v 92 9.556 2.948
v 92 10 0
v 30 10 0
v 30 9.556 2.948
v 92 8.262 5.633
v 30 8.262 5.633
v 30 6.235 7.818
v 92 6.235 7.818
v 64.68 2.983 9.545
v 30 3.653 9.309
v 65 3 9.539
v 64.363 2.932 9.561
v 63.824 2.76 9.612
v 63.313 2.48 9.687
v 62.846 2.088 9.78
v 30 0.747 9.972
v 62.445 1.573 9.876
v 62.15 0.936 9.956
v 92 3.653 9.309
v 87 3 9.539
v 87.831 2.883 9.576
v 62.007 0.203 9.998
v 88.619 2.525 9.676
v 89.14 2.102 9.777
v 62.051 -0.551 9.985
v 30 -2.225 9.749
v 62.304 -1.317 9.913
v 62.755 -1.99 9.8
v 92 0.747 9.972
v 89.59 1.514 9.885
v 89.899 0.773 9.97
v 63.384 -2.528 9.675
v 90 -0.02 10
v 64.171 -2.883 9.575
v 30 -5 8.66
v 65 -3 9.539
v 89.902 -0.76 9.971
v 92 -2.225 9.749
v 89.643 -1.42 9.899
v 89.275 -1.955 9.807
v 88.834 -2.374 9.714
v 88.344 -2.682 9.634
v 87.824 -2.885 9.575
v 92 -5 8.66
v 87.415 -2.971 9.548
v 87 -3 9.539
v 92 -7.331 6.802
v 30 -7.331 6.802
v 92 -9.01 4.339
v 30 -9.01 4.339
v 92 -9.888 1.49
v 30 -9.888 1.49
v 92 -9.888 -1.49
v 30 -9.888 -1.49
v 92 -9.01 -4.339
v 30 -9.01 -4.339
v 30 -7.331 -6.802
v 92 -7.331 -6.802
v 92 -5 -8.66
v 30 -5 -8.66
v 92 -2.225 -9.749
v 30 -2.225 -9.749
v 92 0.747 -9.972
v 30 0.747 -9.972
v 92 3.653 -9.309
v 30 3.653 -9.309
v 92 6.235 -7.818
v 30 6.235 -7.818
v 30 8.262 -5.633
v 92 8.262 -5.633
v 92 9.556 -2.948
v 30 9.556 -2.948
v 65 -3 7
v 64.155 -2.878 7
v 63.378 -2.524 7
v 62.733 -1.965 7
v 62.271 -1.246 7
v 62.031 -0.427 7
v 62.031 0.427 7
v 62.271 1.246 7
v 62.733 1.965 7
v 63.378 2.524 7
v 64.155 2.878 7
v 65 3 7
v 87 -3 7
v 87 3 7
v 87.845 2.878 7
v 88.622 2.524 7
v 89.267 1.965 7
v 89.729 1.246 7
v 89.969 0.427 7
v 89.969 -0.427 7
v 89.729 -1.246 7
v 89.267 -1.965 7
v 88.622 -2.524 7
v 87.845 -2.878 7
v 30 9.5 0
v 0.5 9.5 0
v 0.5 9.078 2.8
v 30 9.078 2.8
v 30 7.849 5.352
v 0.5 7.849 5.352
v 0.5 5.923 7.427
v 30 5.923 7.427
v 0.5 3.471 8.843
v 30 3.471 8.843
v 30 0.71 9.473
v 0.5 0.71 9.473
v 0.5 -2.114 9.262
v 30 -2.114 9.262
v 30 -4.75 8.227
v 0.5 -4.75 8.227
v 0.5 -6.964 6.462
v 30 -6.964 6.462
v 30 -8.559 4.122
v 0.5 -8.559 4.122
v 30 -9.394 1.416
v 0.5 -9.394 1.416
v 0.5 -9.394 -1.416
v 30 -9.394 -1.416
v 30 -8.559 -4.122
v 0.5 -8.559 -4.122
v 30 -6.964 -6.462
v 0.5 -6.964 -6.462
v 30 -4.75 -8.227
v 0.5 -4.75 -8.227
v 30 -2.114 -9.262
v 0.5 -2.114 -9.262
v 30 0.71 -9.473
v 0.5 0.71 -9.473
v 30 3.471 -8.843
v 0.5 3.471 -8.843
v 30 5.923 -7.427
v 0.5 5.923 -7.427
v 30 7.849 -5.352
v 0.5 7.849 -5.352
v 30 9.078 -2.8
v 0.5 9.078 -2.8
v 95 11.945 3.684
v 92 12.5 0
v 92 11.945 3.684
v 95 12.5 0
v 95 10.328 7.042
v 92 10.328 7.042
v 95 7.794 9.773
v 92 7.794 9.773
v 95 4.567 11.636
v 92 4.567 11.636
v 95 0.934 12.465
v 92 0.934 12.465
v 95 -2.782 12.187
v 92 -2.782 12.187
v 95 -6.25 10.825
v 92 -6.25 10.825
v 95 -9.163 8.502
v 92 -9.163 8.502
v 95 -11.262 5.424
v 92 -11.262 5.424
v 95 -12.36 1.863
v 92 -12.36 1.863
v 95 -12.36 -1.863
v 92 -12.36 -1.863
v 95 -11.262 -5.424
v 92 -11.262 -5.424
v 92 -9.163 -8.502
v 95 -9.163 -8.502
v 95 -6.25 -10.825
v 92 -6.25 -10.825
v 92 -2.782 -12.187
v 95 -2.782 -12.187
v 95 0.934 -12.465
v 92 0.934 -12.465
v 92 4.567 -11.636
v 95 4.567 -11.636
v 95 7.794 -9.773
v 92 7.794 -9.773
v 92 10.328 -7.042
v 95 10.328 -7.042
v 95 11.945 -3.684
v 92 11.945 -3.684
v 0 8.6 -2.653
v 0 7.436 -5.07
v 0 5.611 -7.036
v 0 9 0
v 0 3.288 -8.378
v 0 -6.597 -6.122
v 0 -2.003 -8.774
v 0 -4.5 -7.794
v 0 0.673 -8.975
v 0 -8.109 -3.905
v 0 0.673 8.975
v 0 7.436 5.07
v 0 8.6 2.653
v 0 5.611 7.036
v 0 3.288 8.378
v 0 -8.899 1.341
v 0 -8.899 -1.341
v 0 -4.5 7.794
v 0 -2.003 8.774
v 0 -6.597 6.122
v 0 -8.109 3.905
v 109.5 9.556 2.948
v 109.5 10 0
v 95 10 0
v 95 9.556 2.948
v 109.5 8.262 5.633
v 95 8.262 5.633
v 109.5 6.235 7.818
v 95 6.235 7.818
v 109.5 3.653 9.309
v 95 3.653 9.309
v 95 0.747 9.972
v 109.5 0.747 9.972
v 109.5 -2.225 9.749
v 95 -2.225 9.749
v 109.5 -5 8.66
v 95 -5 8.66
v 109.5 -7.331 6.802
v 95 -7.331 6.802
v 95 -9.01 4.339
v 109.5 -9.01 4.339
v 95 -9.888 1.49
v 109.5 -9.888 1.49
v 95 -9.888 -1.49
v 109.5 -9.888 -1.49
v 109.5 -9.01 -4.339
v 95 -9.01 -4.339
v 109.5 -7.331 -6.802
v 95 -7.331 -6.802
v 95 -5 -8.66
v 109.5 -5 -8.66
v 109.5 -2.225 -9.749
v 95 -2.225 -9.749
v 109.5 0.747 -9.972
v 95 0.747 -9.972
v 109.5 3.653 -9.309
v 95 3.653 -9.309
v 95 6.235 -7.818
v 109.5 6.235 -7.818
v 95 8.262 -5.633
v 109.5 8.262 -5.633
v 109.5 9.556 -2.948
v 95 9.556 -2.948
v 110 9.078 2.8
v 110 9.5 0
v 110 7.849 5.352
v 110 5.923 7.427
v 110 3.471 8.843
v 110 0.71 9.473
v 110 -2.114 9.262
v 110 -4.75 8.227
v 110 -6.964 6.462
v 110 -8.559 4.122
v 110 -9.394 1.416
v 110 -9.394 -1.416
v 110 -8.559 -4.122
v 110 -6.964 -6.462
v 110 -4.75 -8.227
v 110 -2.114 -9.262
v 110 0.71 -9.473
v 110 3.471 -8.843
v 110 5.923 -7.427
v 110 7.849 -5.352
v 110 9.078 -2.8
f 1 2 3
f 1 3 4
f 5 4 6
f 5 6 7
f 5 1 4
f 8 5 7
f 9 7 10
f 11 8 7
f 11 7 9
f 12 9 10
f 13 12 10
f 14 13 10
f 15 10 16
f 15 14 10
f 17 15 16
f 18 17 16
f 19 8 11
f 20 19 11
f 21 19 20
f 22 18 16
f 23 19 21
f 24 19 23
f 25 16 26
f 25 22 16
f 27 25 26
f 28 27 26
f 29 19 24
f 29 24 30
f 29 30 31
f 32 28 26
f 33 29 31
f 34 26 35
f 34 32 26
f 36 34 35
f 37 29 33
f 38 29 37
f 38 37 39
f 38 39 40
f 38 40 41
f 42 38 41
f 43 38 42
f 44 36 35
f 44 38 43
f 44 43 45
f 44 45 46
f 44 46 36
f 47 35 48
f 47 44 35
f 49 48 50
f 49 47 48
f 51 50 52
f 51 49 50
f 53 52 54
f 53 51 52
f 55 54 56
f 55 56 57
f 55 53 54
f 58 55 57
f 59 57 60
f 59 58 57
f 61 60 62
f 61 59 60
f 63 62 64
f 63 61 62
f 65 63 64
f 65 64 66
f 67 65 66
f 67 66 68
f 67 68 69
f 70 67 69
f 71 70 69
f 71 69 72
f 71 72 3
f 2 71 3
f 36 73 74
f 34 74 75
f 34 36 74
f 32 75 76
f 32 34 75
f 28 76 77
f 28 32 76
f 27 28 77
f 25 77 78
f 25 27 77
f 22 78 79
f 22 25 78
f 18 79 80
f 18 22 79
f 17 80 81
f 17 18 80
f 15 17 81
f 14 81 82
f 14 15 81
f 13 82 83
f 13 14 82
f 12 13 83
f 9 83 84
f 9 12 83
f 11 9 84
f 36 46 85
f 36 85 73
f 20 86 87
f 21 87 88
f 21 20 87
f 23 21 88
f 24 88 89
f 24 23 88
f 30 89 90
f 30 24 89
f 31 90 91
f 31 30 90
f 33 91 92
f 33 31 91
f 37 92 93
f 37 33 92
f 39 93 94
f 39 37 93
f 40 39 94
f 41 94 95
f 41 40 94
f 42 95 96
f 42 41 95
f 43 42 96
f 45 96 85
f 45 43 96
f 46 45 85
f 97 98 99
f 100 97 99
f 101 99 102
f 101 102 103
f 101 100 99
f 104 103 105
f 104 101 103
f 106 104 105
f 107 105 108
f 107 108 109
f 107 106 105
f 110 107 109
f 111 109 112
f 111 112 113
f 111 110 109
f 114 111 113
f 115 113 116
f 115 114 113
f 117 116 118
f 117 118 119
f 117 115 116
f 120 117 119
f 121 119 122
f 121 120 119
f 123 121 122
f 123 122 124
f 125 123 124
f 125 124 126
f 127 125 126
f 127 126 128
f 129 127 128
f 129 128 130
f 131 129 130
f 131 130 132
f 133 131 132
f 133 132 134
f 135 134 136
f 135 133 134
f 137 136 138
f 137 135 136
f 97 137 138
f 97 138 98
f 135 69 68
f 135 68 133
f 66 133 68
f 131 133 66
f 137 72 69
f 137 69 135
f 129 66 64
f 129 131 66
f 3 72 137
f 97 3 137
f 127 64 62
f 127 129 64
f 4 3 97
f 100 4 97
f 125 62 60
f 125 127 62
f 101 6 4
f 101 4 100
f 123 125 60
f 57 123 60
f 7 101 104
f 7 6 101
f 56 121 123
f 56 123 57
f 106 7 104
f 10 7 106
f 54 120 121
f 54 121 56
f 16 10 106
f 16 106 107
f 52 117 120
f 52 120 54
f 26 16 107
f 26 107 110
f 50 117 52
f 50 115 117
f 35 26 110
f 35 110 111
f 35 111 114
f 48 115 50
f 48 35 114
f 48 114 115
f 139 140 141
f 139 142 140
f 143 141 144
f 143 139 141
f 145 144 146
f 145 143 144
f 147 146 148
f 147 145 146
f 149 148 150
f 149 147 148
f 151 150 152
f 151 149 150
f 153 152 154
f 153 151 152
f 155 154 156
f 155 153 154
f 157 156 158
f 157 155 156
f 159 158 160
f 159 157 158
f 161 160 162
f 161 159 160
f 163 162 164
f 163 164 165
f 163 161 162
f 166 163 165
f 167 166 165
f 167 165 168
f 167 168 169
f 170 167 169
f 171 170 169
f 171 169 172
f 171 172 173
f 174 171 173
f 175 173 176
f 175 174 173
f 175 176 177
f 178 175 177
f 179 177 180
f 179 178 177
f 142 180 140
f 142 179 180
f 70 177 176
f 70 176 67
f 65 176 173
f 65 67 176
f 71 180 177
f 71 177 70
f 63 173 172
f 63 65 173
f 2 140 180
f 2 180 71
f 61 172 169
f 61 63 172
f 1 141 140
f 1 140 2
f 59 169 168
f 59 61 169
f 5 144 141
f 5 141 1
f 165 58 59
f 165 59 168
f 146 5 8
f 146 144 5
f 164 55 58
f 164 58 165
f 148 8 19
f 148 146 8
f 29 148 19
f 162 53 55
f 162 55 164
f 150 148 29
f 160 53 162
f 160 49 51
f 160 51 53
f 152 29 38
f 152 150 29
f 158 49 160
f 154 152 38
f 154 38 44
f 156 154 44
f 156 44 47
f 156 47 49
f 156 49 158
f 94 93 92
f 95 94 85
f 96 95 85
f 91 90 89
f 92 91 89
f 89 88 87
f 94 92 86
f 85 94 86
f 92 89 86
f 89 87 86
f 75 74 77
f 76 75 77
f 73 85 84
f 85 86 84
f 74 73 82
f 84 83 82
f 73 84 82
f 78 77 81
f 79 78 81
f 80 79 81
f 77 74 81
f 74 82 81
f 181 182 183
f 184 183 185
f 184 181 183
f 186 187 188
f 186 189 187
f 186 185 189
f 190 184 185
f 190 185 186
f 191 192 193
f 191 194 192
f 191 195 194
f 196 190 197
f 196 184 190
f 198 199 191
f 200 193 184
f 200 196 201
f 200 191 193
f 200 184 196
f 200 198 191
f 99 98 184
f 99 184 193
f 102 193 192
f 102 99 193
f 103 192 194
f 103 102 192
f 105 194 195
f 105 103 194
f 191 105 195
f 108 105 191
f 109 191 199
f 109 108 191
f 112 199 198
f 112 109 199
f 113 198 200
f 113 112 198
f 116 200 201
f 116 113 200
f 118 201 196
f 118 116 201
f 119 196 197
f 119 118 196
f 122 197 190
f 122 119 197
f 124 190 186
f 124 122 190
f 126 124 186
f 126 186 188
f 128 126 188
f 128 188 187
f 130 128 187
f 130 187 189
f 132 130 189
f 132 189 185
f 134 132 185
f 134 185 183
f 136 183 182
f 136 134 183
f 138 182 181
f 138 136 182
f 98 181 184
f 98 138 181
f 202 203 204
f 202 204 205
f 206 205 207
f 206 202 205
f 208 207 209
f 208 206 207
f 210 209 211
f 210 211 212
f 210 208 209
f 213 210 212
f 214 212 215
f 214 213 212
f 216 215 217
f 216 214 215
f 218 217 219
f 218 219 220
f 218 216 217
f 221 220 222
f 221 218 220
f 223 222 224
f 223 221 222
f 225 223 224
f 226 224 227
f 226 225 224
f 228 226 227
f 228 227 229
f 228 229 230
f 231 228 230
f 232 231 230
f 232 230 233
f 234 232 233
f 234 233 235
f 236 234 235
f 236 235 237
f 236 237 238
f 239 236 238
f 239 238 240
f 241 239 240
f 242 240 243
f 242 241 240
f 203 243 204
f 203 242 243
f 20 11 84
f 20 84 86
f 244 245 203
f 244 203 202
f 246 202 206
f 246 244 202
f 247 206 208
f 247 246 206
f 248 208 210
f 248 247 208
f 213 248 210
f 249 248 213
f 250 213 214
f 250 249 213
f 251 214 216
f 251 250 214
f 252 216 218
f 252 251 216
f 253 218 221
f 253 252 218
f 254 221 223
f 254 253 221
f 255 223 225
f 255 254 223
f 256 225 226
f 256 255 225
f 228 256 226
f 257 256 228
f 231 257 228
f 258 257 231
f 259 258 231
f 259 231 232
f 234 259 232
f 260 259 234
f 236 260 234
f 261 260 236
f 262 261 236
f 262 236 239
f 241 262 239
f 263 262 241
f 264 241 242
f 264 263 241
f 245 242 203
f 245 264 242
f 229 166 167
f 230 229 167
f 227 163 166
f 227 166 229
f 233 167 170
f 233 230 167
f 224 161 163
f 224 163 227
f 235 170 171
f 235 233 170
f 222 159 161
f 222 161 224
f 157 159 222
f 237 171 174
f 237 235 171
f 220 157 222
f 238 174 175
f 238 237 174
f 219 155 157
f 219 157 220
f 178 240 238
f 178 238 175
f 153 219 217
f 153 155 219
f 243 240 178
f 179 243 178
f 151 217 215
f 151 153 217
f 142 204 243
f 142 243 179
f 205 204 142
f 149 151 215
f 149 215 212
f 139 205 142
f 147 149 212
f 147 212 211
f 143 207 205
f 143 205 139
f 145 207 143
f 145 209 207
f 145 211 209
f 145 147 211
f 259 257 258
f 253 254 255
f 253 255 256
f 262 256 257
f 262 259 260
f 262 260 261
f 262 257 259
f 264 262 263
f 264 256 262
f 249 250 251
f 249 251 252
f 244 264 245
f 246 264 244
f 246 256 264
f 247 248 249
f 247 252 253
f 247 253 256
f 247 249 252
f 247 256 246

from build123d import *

# Parameters (mm, degrees)
CUT_EXTRUDE_1_DEPTH = 3
CHAMFER_1_SIZE      = 0.5
CHAMFER_2_SIZE      = 0.5


with BuildPart() as part:
    # 草图1 → 旋转1 (revolve)
    with BuildSketch(Plane.XY):
        Polygon((0, 0), (0, 9.5), (30, 9.5), (30, 10), (92, 10), (92, 12.5), (95, 12.5), (95, 10), (110, 10), (110, 0), align=None)
    revolve(axis=Axis((-40.465116279, 0, 0), (1, 0, 0)))

    # 草图3 → 切除-拉伸1 (cut)
    with BuildSketch(Plane.XY.offset(10)):
        with BuildLine():
            Line((65, 3), (87, 3))
            ThreePointArc((87, 3), (90, 0), (87, -3))
            Line((87, -3), (65, -3))
            ThreePointArc((65, -3), (62, 0), (65, 3))
        make_face()
    extrude(amount=-CUT_EXTRUDE_1_DEPTH, mode=Mode.SUBTRACT)

    # 倒角1
    chamfer_1_edges = [part.edges().sort_by_distance(p)[0] for p in [
        (0, -9.5, 0),
    ]]
    chamfer(chamfer_1_edges, length=CHAMFER_1_SIZE)

    # 倒角2
    chamfer_2_edges = [part.edges().sort_by_distance(p)[0] for p in [
        (110, -10, 0),
    ]]
    chamfer(chamfer_2_edges, length=CHAMFER_2_SIZE)


solid = part.part
